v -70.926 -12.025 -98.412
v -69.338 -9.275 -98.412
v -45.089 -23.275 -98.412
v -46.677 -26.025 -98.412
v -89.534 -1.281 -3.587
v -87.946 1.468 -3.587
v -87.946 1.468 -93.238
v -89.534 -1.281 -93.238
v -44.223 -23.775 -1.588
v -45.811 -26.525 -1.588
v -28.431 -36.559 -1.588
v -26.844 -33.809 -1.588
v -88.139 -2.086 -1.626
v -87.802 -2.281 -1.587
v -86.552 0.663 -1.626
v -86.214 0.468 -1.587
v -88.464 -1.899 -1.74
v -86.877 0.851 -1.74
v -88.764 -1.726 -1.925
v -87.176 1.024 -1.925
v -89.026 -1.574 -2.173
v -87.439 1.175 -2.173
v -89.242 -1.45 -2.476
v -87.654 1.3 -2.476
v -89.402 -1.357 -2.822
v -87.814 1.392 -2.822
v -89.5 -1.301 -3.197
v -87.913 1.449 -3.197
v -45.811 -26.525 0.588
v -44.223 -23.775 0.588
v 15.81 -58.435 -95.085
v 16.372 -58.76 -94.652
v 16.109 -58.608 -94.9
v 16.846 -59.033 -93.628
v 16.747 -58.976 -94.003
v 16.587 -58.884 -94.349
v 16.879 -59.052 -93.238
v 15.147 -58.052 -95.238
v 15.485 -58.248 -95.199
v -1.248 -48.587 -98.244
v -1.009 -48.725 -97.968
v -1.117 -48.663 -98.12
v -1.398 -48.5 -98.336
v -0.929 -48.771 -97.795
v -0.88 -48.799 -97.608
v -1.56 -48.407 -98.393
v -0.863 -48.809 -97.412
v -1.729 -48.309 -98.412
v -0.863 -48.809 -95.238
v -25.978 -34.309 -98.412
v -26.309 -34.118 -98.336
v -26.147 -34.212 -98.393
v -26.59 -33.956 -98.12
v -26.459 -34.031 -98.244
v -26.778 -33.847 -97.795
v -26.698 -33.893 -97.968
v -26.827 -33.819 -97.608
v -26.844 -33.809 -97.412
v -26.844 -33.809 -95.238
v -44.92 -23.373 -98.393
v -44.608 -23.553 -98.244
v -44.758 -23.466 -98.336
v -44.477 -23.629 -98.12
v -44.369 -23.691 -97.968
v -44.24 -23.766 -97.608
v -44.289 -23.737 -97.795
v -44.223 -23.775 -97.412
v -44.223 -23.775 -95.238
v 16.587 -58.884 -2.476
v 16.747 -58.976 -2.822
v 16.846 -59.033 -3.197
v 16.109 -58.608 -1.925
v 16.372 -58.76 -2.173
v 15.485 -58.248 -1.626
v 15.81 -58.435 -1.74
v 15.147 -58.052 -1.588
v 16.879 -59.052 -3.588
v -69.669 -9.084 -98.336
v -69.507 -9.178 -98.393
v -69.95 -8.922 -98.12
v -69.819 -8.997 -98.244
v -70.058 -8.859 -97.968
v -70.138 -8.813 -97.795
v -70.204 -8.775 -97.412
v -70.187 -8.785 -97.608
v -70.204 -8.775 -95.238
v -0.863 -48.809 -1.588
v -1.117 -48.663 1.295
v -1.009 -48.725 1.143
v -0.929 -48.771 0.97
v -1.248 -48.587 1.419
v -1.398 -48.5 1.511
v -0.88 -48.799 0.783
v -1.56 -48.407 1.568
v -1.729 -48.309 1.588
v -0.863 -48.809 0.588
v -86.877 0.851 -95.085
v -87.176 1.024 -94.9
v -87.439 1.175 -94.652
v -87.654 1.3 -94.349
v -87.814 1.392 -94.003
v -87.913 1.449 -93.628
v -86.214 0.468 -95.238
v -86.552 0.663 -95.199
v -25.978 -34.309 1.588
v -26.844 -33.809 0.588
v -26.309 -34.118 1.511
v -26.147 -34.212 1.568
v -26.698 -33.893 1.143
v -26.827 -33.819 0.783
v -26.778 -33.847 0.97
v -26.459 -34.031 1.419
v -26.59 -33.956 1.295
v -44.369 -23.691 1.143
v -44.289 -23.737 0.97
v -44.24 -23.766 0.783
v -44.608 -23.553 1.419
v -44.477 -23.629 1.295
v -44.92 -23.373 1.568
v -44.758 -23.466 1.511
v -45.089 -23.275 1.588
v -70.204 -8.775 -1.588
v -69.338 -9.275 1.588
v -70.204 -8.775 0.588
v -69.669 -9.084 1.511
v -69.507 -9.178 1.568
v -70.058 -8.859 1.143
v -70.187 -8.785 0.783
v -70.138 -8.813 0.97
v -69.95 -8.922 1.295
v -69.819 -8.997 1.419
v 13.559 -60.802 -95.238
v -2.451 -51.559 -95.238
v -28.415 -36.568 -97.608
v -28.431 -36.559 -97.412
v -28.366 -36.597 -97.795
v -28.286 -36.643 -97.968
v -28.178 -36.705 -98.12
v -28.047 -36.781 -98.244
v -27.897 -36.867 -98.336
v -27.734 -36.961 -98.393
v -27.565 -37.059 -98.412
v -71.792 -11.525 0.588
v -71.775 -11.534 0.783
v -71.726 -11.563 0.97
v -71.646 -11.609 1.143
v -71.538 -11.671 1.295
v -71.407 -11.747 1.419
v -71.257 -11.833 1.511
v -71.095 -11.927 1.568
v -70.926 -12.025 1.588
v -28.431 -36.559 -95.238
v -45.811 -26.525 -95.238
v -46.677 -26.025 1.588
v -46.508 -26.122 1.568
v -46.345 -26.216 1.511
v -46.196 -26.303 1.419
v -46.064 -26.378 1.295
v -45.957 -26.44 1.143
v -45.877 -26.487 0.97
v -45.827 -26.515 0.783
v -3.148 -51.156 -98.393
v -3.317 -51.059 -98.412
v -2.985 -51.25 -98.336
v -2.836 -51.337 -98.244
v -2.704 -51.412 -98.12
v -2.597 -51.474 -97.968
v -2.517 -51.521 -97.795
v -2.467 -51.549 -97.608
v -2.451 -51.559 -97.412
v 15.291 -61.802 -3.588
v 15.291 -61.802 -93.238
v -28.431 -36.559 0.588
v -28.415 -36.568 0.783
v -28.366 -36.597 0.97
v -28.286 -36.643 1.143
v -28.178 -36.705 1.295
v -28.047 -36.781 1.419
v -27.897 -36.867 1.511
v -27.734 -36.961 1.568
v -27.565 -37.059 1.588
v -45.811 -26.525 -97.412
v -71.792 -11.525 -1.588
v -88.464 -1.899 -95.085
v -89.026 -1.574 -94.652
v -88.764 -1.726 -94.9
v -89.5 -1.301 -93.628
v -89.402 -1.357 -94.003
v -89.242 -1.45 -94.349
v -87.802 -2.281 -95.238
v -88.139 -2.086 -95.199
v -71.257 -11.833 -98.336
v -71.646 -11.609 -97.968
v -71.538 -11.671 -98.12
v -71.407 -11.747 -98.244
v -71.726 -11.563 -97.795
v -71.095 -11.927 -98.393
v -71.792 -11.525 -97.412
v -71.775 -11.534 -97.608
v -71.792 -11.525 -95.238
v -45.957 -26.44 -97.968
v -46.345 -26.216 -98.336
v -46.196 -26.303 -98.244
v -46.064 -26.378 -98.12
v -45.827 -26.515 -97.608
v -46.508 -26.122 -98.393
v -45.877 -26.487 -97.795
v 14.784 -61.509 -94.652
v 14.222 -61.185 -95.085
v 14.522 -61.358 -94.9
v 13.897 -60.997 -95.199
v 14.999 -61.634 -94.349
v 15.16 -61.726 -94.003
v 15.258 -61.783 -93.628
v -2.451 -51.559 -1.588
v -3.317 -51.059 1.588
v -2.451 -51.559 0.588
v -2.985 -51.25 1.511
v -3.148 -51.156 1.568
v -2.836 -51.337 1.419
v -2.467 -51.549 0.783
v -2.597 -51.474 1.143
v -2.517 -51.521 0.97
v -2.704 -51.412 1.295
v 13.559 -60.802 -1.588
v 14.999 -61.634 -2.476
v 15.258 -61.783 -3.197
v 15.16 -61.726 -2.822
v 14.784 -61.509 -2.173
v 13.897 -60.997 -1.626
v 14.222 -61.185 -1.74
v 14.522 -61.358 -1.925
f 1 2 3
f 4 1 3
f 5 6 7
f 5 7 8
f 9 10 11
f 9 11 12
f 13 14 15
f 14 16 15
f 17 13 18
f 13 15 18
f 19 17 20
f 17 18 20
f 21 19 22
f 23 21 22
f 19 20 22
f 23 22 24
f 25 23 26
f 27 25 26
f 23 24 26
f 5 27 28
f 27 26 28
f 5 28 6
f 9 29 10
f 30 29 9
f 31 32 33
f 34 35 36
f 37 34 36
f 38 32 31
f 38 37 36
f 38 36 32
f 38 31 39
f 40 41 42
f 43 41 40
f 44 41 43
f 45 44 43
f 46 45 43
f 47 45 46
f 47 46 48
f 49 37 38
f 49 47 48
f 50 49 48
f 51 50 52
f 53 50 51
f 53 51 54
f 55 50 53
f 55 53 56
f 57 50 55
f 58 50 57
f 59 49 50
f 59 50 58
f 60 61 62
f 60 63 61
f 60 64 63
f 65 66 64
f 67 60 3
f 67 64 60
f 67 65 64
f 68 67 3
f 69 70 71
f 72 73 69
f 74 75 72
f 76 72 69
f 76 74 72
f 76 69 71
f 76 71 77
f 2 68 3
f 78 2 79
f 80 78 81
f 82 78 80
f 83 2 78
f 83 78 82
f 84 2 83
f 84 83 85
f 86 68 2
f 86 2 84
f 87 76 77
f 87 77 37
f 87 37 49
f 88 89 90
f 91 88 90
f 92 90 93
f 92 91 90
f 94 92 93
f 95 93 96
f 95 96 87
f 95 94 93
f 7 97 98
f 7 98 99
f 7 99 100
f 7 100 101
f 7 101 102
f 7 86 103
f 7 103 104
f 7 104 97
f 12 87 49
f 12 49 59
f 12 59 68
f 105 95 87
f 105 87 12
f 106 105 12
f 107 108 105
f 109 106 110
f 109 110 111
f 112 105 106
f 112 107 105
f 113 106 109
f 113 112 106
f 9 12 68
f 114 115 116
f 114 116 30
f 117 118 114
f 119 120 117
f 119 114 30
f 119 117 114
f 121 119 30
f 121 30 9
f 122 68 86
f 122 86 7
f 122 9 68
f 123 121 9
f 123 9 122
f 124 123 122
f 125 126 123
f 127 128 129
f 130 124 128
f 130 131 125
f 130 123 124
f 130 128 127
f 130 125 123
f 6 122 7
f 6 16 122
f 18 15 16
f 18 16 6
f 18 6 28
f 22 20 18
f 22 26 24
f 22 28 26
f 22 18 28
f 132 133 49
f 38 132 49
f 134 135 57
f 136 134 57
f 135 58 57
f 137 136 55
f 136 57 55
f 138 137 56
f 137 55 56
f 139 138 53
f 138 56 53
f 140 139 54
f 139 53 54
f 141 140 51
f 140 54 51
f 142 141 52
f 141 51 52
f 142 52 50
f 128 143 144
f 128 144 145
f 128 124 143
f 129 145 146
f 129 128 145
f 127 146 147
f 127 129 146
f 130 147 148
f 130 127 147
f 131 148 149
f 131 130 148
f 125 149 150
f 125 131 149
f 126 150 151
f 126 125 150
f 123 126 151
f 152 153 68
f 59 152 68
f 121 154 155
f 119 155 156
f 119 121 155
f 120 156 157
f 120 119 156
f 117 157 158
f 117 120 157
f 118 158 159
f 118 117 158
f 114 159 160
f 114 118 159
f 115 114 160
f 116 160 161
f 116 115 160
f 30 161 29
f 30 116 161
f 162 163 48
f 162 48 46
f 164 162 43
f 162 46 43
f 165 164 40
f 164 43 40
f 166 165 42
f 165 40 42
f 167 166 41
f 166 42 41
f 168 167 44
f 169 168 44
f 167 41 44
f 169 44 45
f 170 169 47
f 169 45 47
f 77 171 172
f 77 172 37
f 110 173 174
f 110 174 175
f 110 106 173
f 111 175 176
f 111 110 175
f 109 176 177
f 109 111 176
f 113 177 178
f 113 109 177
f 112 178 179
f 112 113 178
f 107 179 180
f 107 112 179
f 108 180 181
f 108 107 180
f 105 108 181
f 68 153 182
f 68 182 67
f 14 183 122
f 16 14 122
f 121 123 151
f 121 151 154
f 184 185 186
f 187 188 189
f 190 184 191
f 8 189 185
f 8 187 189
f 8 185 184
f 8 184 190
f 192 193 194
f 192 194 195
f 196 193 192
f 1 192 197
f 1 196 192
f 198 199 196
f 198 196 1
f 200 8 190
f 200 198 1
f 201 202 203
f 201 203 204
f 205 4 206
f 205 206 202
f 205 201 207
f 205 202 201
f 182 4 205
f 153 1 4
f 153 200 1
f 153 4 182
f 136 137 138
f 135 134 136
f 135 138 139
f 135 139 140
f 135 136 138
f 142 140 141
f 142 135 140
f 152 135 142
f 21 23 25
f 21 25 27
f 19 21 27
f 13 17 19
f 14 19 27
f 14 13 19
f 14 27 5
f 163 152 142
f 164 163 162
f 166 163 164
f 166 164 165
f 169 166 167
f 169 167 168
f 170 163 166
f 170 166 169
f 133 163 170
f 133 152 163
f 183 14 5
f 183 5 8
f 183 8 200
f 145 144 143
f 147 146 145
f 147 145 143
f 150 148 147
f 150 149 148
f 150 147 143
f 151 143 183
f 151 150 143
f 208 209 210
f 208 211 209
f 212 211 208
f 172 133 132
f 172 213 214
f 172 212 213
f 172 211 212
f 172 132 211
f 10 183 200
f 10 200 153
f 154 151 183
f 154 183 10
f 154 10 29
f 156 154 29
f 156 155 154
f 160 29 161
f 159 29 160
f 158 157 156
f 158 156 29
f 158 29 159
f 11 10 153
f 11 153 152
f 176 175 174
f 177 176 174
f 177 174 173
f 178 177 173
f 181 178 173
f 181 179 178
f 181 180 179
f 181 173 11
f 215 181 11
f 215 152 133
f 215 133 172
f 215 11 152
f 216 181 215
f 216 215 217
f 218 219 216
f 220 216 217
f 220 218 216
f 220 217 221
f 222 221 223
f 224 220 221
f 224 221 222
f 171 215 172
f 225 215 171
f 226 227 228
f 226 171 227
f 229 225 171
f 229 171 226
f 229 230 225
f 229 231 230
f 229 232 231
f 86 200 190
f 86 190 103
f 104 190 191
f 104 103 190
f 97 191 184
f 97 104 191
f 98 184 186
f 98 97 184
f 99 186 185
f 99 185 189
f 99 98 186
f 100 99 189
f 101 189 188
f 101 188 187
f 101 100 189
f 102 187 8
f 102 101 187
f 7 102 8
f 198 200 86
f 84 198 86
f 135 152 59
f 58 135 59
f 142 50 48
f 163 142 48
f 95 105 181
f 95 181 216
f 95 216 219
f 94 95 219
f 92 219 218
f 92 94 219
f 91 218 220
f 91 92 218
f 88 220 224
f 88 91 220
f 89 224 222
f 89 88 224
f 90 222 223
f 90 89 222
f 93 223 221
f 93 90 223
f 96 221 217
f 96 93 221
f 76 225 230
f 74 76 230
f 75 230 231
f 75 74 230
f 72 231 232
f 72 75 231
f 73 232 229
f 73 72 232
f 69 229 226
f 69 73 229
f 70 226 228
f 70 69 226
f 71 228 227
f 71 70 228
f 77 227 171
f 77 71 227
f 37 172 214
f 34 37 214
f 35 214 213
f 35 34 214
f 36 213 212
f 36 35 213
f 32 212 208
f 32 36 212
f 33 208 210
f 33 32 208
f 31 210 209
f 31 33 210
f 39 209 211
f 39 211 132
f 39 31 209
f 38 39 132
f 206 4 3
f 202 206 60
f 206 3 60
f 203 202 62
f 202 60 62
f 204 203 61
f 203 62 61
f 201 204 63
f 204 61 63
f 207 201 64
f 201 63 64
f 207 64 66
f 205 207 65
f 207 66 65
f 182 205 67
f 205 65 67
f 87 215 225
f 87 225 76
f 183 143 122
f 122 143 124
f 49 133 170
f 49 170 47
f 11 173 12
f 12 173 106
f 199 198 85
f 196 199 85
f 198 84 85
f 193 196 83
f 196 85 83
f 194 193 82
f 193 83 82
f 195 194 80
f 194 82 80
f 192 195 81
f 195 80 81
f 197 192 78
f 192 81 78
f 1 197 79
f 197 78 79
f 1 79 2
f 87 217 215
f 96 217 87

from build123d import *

# Parameters (mm, degrees)
EXTRUDE_THIN1_DEPTH = 100
CAVITY1_START       = -76.897726178
CAVITY1_OUTLINE_W   = 3.175
CAVITY1_OUTLINE_H   = 3.175
CAVITY1_DEPTH       = 20.486772374
CAVITY1_START_2     = 23.656985384
CAVITY1_2_OUTLINE_W = 3.175
CAVITY1_2_OUTLINE_H = 3.175
CAVITY1_2_DEPTH     = 20.486772374
CAVITY1_START_3     = -26.410953804
CAVITY1_3_OUTLINE_W = 3.175
CAVITY1_3_OUTLINE_H = 3.175
CAVITY1_3_DEPTH     = 20.067939188
FILLET1_R           = 2
FILLET2_R           = 1


# Read off the part's stored shape, not the designer's step: Cavity1
with BuildPart() as part:
    # Sketch1 → Extrude-Thin1 (new body)
    with BuildSketch(Plane.XY.offset(1.5875)):
        Polygon((-89.533643617, -1.281367376), (15.291356383, -61.802109344), (16.878856383, -59.052478687), (-87.946143617, 1.468263281), align=None)
    extrude(amount=-EXTRUDE_THIN1_DEPTH)

    # Cavity1 outline → Cavity1 (cut)
    with BuildSketch(Plane(origin=(0, 0, 0), x_dir=(0.5000000000000022, 0.8660254037844374, 0), z_dir=(0.8660254037844374, -0.5000000000000022, 0)).offset(CAVITY1_START)):
        with Locations((-44.289018508, -96.825)):
            Rectangle(CAVITY1_OUTLINE_W, CAVITY1_OUTLINE_H)
        with Locations((-44.289018508, 0)):
            Rectangle(CAVITY1_OUTLINE_W, CAVITY1_OUTLINE_H)
    extrude(amount=CAVITY1_DEPTH, mode=Mode.SUBTRACT)

    # Cavity1 2 outline → Cavity1 2 (cut)
    with BuildSketch(Plane(origin=(0, 0, 0), x_dir=(0.5000000000000022, 0.8660254037844374, 0), z_dir=(0.8660254037844374, -0.5000000000000022, 0)).offset(CAVITY1_START_2)):
        with Locations((-44.289018508, -96.825)):
            Rectangle(CAVITY1_2_OUTLINE_W, CAVITY1_2_OUTLINE_H)
        with Locations((-44.289018508, 0)):
            Rectangle(CAVITY1_2_OUTLINE_W, CAVITY1_2_OUTLINE_H)
    extrude(amount=CAVITY1_2_DEPTH, mode=Mode.SUBTRACT)

    # Cavity1 3 outline → Cavity1 3 (cut)
    with BuildSketch(Plane(origin=(0, 0, 0), x_dir=(0.5000000000000022, 0.8660254037844374, 0), z_dir=(0.8660254037844374, -0.5000000000000022, 0)).offset(CAVITY1_START_3)):
        with Locations((-44.289018508, -96.825)):
            Rectangle(CAVITY1_3_OUTLINE_W, CAVITY1_3_OUTLINE_H)
        with Locations((-44.289018508, 0)):
            Rectangle(CAVITY1_3_OUTLINE_W, CAVITY1_3_OUTLINE_H)
    extrude(amount=CAVITY1_3_DEPTH, mode=Mode.SUBTRACT)

    # Fillet1
    fillet1_edges = [part.edges().sort_by_distance(p)[0] for p in [
        (-88.739893617, 0.093447952, -1.5875),
        (16.085106383, -60.427294016, -1.5875),
        (16.085106383, -60.427294016, -95.2375),
        (-88.739893617, 0.093447952, -95.2375),
    ]]
    fillet(fillet1_edges, radius=FILLET1_R)

    # Fillet2
    fillet2_edges = [part.edges().sort_by_distance(p)[0] for p in [
        (-27.637721048, -35.183907829, -98.4125),
        (-1.656958934, -50.183907829, -98.4125),
        (-45.017066186, -25.149938235, -98.4125),
        (-70.9978283, -10.149938235, -98.4125),
        (-27.637721048, -35.183907829, 1.5875),
        (-45.017066186, -25.149938235, 1.5875),
        (-1.656958934, -50.183907829, 1.5875),
        (-70.9978283, -10.149938235, 1.5875),
    ]]
    fillet(fillet2_edges, radius=FILLET2_R)


solid = part.part
